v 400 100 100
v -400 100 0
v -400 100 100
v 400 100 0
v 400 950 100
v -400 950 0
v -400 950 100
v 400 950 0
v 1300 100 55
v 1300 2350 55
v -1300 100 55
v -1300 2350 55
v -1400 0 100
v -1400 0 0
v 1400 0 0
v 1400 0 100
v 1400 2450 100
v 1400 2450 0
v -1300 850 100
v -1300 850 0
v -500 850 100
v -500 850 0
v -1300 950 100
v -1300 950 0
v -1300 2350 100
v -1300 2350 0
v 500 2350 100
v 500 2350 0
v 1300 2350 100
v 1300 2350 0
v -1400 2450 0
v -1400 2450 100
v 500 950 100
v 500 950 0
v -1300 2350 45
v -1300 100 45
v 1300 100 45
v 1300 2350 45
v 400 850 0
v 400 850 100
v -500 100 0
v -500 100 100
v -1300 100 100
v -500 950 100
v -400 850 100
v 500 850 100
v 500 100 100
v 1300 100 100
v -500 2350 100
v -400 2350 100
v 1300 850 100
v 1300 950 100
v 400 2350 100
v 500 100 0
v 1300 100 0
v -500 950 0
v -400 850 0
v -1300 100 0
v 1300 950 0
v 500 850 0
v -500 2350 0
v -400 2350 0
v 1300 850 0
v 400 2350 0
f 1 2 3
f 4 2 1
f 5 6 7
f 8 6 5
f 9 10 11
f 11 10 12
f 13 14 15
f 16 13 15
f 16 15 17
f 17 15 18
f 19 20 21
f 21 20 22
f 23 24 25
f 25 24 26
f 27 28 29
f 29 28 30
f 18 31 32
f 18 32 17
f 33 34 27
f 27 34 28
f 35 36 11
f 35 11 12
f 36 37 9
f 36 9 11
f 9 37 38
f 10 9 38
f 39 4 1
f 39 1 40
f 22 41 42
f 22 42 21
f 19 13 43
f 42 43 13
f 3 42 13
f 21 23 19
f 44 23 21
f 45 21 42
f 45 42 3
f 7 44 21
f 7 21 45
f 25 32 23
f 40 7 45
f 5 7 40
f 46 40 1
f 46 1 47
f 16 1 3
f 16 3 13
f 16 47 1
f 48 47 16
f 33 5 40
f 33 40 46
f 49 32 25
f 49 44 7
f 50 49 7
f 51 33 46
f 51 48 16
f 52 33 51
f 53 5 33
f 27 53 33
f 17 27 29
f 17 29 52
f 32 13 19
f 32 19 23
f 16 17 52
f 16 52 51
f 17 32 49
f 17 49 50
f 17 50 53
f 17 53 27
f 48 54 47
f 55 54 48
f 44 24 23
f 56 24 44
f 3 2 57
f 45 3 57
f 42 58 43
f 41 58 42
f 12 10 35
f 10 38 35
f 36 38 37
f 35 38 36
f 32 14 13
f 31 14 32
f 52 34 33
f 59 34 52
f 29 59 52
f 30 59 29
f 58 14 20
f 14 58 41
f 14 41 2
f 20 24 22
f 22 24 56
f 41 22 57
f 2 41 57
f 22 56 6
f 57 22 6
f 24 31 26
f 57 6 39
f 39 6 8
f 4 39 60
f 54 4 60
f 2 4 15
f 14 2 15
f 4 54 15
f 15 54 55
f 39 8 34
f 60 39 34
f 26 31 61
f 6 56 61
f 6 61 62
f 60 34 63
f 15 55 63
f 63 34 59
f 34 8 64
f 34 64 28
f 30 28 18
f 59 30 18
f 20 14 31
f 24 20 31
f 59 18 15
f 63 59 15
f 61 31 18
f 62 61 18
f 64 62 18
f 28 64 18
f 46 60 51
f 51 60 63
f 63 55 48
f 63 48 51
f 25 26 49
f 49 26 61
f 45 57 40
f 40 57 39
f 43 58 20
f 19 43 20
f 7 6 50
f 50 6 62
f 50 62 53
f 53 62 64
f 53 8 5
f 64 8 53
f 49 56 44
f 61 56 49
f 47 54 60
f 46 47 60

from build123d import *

# Parameters (mm, degrees)
SKETCH_1_W      = 2800
SKETCH_1_H      = 2450
SKETCH_1_W_2    = 800
SKETCH_1_H_2    = 1400
SKETCH_1_H_3    = 750
EXTRUDE_1_DEPTH = 100
SKETCH_2_W      = 2600
SKETCH_2_H      = 2250
EXTRUDE_2_DEPTH = 5


with BuildPart() as part:
    # Эскиз1 → Бобышка-Вытянуть1 (new body)
    with BuildSketch(Plane.XY):
        with Locations((0, 1225)):
            Rectangle(SKETCH_1_W, SKETCH_1_H)
        with Locations((-900, 1650)):
            Rectangle(SKETCH_1_W_2, SKETCH_1_H_2, mode=Mode.SUBTRACT)
        with Locations((-900, 475)):
            Rectangle(SKETCH_1_W_2, SKETCH_1_H_3, mode=Mode.SUBTRACT)
        with Locations((0, 1650)):
            Rectangle(SKETCH_1_W_2, SKETCH_1_H_2, mode=Mode.SUBTRACT)
        with Locations((0, 475)):
            Rectangle(SKETCH_1_W_2, SKETCH_1_H_3, mode=Mode.SUBTRACT)
        with Locations((900, 1650)):
            Rectangle(SKETCH_1_W_2, SKETCH_1_H_2, mode=Mode.SUBTRACT)
        with Locations((900, 475)):
            Rectangle(SKETCH_1_W_2, SKETCH_1_H_3, mode=Mode.SUBTRACT)
    extrude(amount=EXTRUDE_1_DEPTH)


with BuildPart() as body_2:
    # Эскиз2 → Бобышка-Вытянуть2 (new, symmetric)
    with BuildSketch(Plane(origin=(0, 0, 50), x_dir=(-1, 0, 0), z_dir=(0, 0, -1))):
        with Locations((0, 1225)):
            Rectangle(SKETCH_2_W, SKETCH_2_H)
    extrude(amount=EXTRUDE_2_DEPTH, both=True)


solid = Compound([part.part, body_2.part])
